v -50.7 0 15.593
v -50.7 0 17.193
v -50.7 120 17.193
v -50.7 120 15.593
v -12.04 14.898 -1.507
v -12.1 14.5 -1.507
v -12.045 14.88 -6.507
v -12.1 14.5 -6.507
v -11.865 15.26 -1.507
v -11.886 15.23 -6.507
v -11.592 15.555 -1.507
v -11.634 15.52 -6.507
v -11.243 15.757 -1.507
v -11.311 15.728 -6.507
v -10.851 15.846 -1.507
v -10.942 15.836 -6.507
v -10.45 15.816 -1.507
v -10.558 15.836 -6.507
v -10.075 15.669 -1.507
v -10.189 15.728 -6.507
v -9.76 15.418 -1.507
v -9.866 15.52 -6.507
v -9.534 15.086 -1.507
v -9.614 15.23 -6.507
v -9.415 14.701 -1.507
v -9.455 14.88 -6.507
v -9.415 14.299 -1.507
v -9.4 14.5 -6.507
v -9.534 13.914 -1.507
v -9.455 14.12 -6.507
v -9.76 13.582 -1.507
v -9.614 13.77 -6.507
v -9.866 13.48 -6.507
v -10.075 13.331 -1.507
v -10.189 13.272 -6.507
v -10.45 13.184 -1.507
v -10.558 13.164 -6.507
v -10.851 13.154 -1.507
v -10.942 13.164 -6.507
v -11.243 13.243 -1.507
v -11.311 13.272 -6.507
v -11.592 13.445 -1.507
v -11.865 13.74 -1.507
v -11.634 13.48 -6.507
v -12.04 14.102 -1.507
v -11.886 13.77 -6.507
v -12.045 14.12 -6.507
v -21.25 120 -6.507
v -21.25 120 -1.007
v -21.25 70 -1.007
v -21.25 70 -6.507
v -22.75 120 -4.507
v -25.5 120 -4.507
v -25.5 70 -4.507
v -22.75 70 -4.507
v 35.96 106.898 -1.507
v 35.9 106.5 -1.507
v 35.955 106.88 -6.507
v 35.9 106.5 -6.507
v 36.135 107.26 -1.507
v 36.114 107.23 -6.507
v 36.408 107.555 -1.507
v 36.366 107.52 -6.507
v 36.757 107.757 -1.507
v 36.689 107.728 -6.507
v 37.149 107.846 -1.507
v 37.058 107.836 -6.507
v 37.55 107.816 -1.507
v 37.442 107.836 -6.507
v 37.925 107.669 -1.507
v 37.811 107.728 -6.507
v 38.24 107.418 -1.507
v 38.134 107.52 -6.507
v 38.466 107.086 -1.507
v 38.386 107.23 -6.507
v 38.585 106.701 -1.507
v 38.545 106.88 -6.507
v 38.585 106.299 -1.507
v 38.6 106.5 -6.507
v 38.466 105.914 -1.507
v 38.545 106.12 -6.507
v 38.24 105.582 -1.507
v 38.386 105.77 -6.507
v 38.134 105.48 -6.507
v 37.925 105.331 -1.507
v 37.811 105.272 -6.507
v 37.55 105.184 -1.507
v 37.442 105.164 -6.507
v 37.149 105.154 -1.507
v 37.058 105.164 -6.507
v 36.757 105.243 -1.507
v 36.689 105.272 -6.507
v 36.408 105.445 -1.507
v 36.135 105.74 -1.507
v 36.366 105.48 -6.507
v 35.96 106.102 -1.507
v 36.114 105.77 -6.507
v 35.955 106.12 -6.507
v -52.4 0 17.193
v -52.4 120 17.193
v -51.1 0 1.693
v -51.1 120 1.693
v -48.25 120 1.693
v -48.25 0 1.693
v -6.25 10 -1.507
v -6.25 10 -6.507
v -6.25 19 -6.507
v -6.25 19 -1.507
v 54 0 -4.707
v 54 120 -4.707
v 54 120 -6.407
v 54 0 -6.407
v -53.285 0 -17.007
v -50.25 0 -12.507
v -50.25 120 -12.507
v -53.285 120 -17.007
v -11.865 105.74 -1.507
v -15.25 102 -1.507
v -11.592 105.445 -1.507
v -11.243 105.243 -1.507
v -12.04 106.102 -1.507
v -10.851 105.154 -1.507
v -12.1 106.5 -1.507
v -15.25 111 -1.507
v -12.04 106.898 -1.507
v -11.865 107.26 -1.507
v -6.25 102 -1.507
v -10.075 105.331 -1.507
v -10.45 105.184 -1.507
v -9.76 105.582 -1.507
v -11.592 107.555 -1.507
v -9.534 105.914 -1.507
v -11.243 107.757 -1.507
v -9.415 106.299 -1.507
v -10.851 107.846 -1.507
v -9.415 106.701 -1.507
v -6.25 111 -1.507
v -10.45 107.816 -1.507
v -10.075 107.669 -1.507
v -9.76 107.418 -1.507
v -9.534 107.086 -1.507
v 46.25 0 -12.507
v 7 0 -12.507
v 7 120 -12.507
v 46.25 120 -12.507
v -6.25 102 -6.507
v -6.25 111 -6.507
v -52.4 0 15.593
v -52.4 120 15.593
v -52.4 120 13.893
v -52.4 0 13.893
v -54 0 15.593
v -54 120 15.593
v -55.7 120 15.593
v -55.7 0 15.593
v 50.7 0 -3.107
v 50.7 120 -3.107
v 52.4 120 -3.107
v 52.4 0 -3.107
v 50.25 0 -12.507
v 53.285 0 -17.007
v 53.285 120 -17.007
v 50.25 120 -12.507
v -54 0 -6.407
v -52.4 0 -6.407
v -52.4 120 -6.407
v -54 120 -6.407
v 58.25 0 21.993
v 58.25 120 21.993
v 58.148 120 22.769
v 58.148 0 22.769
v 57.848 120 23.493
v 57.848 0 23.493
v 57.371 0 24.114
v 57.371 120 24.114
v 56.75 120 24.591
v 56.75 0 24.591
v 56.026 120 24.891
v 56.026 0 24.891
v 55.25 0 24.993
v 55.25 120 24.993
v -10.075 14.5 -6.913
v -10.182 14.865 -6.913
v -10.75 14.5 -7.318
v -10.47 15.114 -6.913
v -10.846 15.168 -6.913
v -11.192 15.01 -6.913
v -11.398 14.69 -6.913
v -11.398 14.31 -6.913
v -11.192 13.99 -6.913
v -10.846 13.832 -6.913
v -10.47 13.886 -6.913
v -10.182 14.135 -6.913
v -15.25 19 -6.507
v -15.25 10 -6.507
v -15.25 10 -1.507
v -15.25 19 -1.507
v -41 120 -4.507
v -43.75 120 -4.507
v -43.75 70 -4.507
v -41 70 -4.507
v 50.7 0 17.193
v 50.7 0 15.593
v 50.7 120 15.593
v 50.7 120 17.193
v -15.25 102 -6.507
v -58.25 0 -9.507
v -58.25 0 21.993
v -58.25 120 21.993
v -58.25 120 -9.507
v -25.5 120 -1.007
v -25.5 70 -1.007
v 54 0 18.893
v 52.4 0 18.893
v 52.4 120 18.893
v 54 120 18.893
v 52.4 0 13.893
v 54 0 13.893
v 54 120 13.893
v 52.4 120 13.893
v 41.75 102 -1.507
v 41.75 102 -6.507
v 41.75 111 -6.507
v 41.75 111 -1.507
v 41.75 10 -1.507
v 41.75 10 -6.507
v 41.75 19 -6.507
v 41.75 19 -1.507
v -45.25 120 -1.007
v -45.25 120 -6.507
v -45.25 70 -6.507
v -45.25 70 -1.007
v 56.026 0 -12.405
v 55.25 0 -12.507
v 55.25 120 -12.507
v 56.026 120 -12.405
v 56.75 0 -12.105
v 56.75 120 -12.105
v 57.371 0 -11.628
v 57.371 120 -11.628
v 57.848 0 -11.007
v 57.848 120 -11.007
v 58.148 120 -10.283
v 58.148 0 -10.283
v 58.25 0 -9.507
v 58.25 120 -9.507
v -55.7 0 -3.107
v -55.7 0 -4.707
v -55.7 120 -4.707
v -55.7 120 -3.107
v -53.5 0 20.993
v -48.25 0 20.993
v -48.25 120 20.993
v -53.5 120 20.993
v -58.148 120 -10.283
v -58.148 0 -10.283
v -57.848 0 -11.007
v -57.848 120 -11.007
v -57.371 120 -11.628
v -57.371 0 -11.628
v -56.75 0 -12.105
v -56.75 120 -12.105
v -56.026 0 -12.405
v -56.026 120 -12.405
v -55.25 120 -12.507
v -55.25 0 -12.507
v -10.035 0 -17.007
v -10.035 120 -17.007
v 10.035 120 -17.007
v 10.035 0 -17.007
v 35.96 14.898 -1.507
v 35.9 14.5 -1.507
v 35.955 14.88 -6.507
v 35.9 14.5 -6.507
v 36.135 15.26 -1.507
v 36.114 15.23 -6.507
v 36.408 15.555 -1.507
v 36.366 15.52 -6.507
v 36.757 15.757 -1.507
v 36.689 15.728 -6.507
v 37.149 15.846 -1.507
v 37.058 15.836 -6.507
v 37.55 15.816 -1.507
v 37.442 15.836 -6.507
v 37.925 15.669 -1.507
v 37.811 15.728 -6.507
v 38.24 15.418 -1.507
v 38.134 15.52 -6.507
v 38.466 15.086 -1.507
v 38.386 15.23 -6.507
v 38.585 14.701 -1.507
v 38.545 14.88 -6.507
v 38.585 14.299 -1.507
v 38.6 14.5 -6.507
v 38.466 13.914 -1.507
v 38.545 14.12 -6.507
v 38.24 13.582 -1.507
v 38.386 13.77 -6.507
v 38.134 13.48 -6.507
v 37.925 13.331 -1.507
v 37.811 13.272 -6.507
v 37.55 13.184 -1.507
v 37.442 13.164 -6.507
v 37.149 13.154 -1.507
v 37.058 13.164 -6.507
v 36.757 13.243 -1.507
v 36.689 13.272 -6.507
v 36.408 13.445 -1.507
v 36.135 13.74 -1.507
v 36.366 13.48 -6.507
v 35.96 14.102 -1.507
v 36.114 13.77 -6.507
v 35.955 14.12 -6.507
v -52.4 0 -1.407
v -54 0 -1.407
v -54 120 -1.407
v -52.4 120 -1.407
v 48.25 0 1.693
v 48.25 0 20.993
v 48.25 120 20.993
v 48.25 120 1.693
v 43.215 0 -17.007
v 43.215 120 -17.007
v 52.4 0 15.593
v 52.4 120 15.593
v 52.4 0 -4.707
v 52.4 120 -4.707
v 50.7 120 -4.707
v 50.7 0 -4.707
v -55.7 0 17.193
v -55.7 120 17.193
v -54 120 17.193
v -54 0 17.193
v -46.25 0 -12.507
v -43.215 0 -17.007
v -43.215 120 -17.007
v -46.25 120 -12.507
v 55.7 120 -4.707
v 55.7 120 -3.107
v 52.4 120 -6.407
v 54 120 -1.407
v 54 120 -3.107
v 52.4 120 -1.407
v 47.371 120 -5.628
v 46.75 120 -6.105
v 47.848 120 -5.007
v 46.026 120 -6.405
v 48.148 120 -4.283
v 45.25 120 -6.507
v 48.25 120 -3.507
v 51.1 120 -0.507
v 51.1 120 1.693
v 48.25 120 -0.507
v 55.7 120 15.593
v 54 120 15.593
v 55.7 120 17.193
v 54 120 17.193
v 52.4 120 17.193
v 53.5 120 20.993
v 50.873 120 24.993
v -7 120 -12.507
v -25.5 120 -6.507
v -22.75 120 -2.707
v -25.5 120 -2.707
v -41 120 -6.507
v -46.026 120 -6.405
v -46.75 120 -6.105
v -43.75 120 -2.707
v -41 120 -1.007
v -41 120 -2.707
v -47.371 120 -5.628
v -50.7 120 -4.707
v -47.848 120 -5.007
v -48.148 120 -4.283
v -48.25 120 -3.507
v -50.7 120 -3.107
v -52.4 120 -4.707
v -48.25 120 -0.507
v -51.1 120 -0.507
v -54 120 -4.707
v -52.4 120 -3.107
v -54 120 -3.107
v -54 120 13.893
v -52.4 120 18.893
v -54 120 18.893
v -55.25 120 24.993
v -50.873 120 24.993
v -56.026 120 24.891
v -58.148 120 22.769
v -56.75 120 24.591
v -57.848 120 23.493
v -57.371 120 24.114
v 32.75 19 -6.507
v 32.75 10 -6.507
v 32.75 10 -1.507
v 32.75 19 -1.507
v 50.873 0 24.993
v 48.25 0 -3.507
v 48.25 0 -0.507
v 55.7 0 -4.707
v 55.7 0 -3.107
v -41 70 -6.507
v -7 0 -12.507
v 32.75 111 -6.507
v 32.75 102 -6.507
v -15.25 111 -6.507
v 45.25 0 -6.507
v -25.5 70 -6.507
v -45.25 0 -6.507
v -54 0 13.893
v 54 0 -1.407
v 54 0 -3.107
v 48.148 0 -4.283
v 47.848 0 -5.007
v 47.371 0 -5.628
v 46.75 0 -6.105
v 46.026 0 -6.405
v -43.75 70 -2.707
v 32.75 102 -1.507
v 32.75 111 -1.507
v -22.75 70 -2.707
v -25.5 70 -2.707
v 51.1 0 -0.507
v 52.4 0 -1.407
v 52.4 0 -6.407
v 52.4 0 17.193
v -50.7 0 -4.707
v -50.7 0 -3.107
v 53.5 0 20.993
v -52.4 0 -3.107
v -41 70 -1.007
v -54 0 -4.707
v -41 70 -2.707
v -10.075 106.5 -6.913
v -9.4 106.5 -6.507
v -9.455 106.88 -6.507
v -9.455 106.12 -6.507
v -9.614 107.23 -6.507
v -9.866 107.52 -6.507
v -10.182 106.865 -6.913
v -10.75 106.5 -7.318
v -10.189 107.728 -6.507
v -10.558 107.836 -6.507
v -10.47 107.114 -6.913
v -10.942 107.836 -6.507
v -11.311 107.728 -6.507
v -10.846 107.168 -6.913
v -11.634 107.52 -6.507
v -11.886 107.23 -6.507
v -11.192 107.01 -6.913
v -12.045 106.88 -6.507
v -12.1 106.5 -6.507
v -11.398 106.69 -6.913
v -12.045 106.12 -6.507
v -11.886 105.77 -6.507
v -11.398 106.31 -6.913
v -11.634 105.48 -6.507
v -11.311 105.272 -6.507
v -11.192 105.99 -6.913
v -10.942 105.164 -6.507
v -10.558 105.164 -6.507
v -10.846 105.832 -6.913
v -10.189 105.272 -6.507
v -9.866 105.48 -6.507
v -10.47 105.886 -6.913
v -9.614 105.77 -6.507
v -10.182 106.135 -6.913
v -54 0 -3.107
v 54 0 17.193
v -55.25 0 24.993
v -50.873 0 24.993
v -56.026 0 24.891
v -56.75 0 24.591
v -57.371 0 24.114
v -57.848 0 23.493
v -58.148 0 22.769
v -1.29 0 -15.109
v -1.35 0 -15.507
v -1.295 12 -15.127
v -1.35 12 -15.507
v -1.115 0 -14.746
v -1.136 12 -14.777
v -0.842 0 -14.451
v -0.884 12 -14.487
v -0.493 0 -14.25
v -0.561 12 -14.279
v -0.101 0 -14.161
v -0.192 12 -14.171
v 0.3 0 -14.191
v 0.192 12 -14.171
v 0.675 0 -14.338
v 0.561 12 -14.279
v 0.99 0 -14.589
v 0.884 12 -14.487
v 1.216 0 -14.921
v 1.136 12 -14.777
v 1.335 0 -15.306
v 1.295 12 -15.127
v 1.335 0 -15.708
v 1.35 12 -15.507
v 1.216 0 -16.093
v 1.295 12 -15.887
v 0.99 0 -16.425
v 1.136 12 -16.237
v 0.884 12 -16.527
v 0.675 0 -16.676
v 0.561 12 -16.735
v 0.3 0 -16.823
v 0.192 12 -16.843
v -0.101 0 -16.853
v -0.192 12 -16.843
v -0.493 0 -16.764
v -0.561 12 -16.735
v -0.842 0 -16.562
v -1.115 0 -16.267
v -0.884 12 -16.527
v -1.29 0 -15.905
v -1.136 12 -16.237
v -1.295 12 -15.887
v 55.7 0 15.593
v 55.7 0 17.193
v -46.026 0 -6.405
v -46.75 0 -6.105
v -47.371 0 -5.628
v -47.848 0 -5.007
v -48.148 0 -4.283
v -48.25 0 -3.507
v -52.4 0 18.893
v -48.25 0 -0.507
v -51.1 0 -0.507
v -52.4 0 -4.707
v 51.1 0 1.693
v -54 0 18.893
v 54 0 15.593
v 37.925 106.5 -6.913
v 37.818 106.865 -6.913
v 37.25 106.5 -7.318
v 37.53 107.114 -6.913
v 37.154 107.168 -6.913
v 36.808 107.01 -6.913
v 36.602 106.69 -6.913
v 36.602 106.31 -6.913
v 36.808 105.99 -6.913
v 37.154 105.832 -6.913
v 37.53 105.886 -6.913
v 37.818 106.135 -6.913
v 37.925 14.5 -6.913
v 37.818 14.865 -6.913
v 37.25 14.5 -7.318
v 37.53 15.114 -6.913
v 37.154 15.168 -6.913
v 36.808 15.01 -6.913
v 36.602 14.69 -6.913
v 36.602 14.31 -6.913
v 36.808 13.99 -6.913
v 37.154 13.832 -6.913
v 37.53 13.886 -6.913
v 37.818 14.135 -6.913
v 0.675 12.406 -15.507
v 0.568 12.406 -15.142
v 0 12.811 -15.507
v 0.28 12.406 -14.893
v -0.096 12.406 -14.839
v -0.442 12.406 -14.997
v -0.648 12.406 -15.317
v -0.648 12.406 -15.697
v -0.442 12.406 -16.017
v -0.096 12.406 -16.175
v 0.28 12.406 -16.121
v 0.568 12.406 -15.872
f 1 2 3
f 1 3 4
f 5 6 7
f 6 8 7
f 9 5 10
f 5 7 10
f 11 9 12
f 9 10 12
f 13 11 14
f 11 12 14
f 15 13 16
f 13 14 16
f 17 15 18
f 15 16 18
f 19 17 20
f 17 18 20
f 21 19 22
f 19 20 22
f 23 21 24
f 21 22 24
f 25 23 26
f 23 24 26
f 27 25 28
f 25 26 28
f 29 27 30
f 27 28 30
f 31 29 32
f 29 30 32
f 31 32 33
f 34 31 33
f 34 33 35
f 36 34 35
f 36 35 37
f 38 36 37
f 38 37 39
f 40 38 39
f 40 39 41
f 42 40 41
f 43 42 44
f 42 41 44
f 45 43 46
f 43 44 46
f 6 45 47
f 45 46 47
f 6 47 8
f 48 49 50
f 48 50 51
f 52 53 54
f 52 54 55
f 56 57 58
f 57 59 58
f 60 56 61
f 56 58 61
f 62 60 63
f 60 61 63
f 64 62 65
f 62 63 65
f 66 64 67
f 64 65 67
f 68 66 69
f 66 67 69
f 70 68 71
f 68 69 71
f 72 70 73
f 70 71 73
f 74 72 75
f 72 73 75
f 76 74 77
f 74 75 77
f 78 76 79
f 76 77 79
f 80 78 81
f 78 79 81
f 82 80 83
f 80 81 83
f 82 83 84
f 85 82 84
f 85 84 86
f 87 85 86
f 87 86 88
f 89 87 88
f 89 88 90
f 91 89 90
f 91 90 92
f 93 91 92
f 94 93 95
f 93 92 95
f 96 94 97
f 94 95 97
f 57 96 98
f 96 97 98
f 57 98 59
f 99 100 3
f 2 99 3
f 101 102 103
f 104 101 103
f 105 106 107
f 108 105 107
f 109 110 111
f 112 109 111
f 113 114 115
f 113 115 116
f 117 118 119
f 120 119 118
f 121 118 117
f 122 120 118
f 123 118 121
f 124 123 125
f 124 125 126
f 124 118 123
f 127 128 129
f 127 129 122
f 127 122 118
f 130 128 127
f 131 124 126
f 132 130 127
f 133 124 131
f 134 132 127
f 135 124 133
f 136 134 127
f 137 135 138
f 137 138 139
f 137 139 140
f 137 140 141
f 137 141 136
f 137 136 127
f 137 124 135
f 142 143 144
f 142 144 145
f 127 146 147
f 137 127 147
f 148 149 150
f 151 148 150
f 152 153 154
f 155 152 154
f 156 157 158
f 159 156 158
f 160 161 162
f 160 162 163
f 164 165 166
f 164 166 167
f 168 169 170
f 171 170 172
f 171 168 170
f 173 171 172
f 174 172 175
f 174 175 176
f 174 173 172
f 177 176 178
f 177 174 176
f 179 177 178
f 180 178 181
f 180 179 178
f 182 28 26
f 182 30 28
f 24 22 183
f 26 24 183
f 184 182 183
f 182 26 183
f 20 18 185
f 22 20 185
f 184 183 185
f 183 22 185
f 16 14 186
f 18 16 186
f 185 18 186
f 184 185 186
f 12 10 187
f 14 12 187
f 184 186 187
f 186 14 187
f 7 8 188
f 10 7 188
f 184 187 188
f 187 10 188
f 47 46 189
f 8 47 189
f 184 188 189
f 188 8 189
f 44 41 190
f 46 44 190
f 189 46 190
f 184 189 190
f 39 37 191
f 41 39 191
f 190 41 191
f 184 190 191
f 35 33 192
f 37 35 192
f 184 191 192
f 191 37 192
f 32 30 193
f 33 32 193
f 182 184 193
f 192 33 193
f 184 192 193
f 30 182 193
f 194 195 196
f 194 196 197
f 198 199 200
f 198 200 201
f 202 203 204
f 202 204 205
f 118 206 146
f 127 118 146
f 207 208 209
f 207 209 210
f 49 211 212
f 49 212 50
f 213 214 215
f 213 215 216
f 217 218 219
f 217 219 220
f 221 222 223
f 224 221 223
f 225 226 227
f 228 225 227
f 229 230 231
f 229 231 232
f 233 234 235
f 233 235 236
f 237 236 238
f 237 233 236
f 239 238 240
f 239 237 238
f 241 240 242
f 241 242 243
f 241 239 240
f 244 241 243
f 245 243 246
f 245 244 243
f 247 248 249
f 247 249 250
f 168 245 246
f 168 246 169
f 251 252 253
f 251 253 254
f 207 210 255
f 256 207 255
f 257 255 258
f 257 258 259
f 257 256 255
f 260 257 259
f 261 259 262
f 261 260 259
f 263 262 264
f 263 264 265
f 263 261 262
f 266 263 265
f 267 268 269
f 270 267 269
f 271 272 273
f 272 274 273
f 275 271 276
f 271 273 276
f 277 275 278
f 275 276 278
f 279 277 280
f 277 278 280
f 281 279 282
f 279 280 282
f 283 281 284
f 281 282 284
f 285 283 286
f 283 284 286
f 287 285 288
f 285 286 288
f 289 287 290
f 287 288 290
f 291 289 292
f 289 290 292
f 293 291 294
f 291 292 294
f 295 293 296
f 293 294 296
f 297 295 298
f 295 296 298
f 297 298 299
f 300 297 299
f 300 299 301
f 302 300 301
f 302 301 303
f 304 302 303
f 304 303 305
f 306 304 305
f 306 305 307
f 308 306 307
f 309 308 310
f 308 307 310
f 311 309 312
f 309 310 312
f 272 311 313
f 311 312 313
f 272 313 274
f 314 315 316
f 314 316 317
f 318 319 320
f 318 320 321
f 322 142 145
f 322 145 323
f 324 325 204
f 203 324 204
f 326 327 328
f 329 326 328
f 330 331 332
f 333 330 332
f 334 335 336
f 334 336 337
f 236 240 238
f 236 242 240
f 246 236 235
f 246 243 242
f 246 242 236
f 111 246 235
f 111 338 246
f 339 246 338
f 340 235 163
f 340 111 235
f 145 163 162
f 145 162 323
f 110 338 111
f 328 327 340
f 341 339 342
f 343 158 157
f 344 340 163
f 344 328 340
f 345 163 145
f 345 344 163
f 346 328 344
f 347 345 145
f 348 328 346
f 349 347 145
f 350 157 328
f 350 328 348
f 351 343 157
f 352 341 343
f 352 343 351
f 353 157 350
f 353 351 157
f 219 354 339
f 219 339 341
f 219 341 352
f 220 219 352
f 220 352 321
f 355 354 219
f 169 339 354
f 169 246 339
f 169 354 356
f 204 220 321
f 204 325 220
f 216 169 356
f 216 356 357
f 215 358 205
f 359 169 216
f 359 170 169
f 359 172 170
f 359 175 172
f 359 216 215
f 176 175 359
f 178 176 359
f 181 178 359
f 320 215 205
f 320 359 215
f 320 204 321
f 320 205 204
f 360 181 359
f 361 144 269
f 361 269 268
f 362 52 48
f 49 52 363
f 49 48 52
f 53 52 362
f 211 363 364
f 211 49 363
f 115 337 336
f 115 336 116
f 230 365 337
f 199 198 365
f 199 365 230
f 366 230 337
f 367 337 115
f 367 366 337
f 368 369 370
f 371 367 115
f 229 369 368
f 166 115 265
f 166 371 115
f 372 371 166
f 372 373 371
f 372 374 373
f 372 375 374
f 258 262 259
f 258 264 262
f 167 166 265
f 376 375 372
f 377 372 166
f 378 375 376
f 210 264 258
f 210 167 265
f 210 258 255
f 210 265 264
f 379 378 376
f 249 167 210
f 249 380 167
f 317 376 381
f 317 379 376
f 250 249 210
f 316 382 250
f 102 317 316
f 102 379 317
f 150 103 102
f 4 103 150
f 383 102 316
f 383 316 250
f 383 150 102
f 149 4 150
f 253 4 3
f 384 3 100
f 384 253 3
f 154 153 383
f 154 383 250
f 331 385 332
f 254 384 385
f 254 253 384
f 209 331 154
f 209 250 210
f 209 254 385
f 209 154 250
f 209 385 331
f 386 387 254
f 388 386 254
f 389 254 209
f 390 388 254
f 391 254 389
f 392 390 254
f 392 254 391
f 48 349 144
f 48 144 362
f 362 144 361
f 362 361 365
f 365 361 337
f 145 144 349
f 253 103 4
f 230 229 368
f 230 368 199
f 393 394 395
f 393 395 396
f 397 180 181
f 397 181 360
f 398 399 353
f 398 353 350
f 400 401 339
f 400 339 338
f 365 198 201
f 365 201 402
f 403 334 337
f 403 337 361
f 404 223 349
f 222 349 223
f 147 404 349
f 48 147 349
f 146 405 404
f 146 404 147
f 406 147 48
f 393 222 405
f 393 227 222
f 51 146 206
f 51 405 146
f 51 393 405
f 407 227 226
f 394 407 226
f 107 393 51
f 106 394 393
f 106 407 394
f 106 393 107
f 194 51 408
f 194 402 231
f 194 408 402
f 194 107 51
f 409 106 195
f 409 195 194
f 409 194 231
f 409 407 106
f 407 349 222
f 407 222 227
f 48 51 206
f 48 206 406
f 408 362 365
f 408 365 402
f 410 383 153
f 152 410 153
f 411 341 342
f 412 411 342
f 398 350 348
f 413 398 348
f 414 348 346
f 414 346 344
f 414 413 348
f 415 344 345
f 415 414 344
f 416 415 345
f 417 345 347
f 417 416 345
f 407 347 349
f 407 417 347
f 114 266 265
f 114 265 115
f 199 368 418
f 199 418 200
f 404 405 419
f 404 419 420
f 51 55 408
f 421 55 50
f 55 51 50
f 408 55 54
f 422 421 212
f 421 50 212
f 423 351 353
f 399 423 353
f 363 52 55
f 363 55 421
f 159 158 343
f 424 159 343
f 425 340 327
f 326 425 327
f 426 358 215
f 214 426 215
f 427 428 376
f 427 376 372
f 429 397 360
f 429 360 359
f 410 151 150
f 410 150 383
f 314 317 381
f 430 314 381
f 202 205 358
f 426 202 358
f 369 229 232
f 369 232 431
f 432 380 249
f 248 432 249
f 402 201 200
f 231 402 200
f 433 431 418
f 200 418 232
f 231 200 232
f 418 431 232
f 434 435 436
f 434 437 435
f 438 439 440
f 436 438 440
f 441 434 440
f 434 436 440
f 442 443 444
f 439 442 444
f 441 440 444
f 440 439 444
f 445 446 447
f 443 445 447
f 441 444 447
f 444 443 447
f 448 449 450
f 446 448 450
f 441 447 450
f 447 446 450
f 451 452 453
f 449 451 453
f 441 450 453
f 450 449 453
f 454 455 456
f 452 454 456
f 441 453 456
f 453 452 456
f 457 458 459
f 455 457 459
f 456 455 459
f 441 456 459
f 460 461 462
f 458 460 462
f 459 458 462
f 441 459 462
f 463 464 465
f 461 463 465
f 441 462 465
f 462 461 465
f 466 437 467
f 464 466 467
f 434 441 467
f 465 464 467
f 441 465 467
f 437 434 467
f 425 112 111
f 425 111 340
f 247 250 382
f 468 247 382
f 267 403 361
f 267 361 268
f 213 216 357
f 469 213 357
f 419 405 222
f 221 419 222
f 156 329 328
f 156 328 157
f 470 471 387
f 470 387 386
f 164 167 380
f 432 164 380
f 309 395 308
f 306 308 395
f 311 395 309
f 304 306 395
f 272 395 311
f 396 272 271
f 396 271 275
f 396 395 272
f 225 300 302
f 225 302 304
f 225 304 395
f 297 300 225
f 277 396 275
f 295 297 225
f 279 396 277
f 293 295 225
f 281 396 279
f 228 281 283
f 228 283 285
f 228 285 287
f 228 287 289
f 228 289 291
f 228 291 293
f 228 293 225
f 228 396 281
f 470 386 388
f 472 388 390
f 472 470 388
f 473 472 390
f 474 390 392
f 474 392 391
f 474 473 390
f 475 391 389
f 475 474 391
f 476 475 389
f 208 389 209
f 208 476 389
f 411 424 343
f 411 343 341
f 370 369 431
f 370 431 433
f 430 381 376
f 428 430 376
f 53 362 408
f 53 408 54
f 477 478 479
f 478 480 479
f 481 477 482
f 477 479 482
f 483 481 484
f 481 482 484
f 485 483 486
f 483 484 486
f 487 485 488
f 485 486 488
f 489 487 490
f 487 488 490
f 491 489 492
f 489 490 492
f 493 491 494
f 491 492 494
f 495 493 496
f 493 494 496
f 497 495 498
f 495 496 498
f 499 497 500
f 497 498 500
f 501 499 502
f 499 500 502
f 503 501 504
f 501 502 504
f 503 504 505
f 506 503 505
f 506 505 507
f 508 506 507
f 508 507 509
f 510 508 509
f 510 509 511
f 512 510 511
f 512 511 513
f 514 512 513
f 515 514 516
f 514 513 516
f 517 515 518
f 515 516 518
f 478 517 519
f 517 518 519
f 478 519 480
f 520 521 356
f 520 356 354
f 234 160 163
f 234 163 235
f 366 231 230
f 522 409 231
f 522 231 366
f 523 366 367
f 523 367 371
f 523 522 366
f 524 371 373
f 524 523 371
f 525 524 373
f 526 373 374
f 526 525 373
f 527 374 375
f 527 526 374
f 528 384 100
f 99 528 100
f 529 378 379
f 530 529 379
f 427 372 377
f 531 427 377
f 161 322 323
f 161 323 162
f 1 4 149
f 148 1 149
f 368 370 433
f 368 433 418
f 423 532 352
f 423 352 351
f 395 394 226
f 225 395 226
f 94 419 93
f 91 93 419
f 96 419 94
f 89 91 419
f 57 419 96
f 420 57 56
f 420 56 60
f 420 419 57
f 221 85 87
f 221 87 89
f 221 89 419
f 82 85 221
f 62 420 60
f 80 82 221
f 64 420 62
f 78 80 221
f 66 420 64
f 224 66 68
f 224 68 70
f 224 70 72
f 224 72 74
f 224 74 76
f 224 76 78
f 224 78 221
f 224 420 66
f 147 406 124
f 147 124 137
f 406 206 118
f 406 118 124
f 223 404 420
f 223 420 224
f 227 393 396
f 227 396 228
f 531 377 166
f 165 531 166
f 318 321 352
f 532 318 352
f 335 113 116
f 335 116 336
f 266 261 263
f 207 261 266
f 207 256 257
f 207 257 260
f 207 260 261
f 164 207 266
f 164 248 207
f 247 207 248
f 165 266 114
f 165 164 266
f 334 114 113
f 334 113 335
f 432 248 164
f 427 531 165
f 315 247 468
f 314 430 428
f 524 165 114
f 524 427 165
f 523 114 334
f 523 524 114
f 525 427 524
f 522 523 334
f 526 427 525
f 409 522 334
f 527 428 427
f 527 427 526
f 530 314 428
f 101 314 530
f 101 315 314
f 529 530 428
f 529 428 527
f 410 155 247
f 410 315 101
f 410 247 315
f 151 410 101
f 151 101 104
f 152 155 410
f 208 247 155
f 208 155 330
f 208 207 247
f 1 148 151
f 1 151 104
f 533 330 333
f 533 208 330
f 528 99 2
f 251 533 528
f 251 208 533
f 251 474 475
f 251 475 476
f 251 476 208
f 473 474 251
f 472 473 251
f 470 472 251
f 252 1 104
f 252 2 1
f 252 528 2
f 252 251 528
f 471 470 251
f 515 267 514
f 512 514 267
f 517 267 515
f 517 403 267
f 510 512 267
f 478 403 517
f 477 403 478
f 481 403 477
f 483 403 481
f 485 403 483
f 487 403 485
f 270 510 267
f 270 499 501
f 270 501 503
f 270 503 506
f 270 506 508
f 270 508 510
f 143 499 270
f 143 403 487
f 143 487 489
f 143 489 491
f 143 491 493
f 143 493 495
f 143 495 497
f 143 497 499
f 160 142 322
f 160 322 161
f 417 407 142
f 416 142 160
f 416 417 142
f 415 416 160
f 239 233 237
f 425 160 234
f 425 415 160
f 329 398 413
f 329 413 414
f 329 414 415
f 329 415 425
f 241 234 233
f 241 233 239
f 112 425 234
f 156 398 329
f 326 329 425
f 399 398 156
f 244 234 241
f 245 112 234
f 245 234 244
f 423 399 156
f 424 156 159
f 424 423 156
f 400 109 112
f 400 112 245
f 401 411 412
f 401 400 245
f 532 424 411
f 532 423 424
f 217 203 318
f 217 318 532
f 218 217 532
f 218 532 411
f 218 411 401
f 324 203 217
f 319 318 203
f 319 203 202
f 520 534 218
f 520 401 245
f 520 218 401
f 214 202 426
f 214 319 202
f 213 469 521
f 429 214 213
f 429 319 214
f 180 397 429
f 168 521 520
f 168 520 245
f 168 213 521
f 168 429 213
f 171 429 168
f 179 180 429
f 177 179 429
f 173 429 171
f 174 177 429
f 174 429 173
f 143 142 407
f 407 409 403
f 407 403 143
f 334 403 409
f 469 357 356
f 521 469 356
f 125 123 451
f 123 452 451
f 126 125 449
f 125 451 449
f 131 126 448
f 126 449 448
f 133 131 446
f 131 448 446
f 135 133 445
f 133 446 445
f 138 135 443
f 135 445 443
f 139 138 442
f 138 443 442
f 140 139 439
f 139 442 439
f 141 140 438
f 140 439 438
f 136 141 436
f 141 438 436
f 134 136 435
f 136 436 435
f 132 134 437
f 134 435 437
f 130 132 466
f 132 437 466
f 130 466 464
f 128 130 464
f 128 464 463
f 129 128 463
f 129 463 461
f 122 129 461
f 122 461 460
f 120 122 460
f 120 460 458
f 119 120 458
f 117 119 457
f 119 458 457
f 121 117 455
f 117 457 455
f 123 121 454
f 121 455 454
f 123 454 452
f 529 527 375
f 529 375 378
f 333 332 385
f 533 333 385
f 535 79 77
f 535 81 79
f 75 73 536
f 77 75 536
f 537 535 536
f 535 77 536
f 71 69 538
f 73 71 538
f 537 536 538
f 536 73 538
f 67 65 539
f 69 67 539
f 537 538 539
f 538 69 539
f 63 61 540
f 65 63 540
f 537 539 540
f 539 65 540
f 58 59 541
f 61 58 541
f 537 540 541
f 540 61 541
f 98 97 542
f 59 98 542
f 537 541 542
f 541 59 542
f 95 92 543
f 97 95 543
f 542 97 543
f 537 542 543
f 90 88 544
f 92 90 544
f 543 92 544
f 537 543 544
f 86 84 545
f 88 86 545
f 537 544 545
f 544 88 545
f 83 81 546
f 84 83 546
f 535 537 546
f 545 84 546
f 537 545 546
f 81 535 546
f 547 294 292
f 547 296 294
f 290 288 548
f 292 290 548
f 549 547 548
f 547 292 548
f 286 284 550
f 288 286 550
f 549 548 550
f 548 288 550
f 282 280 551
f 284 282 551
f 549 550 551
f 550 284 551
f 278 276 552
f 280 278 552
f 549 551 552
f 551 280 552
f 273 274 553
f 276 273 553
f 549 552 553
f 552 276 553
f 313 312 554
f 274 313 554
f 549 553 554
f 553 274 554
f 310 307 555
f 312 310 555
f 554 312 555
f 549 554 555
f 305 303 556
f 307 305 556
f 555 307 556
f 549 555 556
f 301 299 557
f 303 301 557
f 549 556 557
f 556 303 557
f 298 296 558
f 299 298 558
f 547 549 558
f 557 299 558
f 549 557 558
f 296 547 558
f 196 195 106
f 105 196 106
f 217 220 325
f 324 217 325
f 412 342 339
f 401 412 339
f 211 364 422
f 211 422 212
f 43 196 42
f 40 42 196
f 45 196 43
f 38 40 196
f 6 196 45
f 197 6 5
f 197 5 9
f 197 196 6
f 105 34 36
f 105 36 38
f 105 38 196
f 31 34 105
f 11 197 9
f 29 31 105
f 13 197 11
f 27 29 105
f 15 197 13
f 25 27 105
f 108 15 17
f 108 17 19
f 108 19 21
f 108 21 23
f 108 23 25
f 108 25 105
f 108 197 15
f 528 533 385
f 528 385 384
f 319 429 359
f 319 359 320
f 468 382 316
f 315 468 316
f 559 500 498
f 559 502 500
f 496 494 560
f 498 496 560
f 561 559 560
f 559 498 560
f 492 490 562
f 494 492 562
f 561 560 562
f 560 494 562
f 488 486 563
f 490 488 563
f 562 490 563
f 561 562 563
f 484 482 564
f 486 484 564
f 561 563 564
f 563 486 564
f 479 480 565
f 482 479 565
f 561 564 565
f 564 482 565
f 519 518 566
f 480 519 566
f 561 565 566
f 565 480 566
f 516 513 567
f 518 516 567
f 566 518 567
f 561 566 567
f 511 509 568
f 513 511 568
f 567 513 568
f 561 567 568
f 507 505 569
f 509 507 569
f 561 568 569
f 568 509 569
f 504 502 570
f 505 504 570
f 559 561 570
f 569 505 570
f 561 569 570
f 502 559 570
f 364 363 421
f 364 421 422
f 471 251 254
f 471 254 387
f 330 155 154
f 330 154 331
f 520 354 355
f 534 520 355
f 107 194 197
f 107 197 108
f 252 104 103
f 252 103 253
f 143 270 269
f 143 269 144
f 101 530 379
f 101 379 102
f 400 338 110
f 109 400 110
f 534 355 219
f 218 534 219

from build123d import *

# Parameters (mm, degrees)
F1_DEPTH = 120
F3_D     = 2.7
F3_DEPTH = 12
F3_TIP   = 0.8111618357
F4_W     = 9
F4_H     = 9
F5_DEPTH = 5
F7_D     = 2.7
F7_DEPTH = 5
F7_TIP   = 0.8111618357
F9_DEPTH = 50


with BuildPart() as f1:
    # F0 (on Front) → F1 (new body)
    with BuildSketch(Plane.XZ):
        with BuildLine():
            Line((-10.0352883258, -17.0069661875), (0, -17.0069661875))
            Line((0, -17.0069661875), (10.0352883258, -17.0069661875))
            Line((10.0352883258, -17.0069661875), (7, -12.5069661875))
            Line((7, -12.5069661875), (46.25, -12.5069661875))
            Line((46.25, -12.5069661875), (43.2147116742, -17.0069661875))
            Line((43.2147116742, -17.0069661875), (53.2852883258, -17.0069661875))
            Line((53.2852883258, -17.0069661875), (50.25, -12.5069661875))
            Line((50.25, -12.5069661875), (55.25, -12.5069661875))
            ThreePointArc((55.25, -12.5069661875), (57.3713203436, -11.6282865311), (58.25, -9.5069661875))
            Line((58.25, -9.5069661875), (58.25, 21.9930338125))
            ThreePointArc((58.25, 21.9930338125), (57.3713203436, 24.114354156), (55.25, 24.9930338125))
            Line((55.25, 24.9930338125), (50.8726710718, 24.9930338125))
            Line((50.8726710718, 24.9930338125), (53.5, 20.9930338125))
            Line((53.5, 20.9930338125), (48.25, 20.9930338125))
            Line((48.25, 20.9930338125), (48.25, 1.6930338125))
            Line((48.25, 1.6930338125), (51.1, 1.6930338125))
            Line((51.1, 1.6930338125), (51.1, -0.5069661875))
            Line((51.1, -0.5069661875), (48.25, -0.5069661875))
            Line((48.25, -0.5069661875), (48.25, -3.5069661875))
            ThreePointArc((48.25, -3.5069661875), (47.3713203436, -5.6282865311), (45.25, -6.5069661875))
            Line((45.25, -6.5069661875), (0, -6.5069661875))
            Line((0, -6.5069661875), (-45.25, -6.5069661875))
            ThreePointArc((-45.25, -6.5069661875), (-47.3713203436, -5.6282865311), (-48.25, -3.5069661875))
            Line((-48.25, -3.5069661875), (-48.25, -0.5069661875))
            Line((-48.25, -0.5069661875), (-51.1, -0.5069661875))
            Line((-51.1, -0.5069661875), (-51.1, 1.6930338125))
            Line((-51.1, 1.6930338125), (-48.25, 1.6930338125))
            Line((-48.25, 1.6930338125), (-48.25, 20.9930338125))
            Line((-48.25, 20.9930338125), (-53.5, 20.9930338125))
            Line((-53.5, 20.9930338125), (-50.8726710718, 24.9930338125))
            Line((-50.8726710718, 24.9930338125), (-55.25, 24.9930338125))
            ThreePointArc((-55.25, 24.9930338125), (-57.3713203436, 24.114354156), (-58.25, 21.9930338125))
            Line((-58.25, 21.9930338125), (-58.25, -9.5069661875))
            ThreePointArc((-58.25, -9.5069661875), (-57.3713203436, -11.6282865311), (-55.25, -12.5069661875))
            Line((-55.25, -12.5069661875), (-50.25, -12.5069661875))
            Line((-50.25, -12.5069661875), (-53.2852883258, -17.0069661875))
            Line((-53.2852883258, -17.0069661875), (-43.2147116742, -17.0069661875))
            Line((-43.2147116742, -17.0069661875), (-46.25, -12.5069661875))
            Line((-46.25, -12.5069661875), (-7, -12.5069661875))
            Line((-7, -12.5069661875), (-10.0352883258, -17.0069661875))
        make_face()
        Polygon((-54, -3.1069661875), (-54, -1.4069661875), (-52.4, -1.4069661875), (-52.4, -3.1069661875), (-50.7, -3.1069661875), (-50.7, -4.7069661875), (-52.4, -4.7069661875), (-52.4, -6.4069661875), (-54, -6.4069661875), (-54, -4.7069661875), (-55.7, -4.7069661875), (-55.7, -3.1069661875), align=None, mode=Mode.SUBTRACT)
        Polygon((52.4, -1.4069661875), (54, -1.4069661875), (54, -3.1069661875), (55.7, -3.1069661875), (55.7, -4.7069661875), (54, -4.7069661875), (54, -6.4069661875), (52.4, -6.4069661875), (52.4, -4.7069661875), (50.7, -4.7069661875), (50.7, -3.1069661875), (52.4, -3.1069661875), align=None, mode=Mode.SUBTRACT)
        Polygon((-55.7, 15.5930338125), (-55.7, 17.1930338125), (-54, 17.1930338125), (-54, 18.8930338125), (-52.4, 18.8930338125), (-52.4, 17.1930338125), (-50.7, 17.1930338125), (-50.7, 15.5930338125), (-52.4, 15.5930338125), (-52.4, 13.8930338125), (-54, 13.8930338125), (-54, 15.5930338125), align=None, mode=Mode.SUBTRACT)
        Polygon((54, 18.8930338125), (54, 17.1930338125), (55.7, 17.1930338125), (55.7, 15.5930338125), (54, 15.5930338125), (54, 13.8930338125), (52.4, 13.8930338125), (52.4, 15.5930338125), (50.7, 15.5930338125), (50.7, 17.1930338125), (52.4, 17.1930338125), (52.4, 18.8930338125), align=None, mode=Mode.SUBTRACT)
    extrude(amount=-F1_DEPTH)

    # F3
    with Locations(Plane.XZ):
        with Locations((0, -15.5069661875)):
            Hole(F3_D / 2, depth=F3_DEPTH)
            with Locations((0, 0, -(F3_DEPTH + F3_TIP / 2))):  # 118° drill point
                Cone(0, F3_D / 2, F3_TIP, mode=Mode.SUBTRACT)

    # F4 (on face) → F5 (join)
    with BuildSketch(Plane.XY.offset(-6.5069661875)):
        with Locations((-10.75, 14.5)):
            Rectangle(F4_W, F4_H)
        with Locations((-10.75, 106.5)):
            Rectangle(F4_W, F4_H)
        with Locations((37.25, 14.5)):
            Rectangle(F4_W, F4_H)
        with Locations((37.25, 106.5)):
            Rectangle(F4_W, F4_H)
    extrude(amount=F5_DEPTH)

    # F7
    with Locations(Plane.XY.offset(-1.5069661875)):
        with Locations((-10.75, 106.5), (37.25, 106.5), (-10.75, 14.5), (37.25, 14.5)):
            Hole(F7_D / 2, depth=F7_DEPTH)
            with Locations((0, 0, -(F7_DEPTH + F7_TIP / 2))):  # 118° drill point
                Cone(0, F7_D / 2, F7_TIP, mode=Mode.SUBTRACT)

    # F8 (on face) → F9 (join)
    with BuildSketch(Plane(origin=(0, 120, 0), x_dir=(-1, 0, 0), z_dir=(0, 1, 0))):
        Polygon((21.25, -1.0069661875), (21.25, -6.5069661875), (25.5, -6.5069661875), (25.5, -4.5069661875), (22.75, -4.5069661875), (22.75, -2.7069661875), (25.5, -2.7069661875), (25.5, -1.0069661875), align=None)
        Polygon((41, -4.5069661875), (41, -6.5069661875), (45.25, -6.5069661875), (45.25, -1.0069661875), (41, -1.0069661875), (41, -2.7069661875), (43.75, -2.7069661875), (43.75, -4.5069661875), align=None)
    extrude(amount=-F9_DEPTH)


solid = f1.part
